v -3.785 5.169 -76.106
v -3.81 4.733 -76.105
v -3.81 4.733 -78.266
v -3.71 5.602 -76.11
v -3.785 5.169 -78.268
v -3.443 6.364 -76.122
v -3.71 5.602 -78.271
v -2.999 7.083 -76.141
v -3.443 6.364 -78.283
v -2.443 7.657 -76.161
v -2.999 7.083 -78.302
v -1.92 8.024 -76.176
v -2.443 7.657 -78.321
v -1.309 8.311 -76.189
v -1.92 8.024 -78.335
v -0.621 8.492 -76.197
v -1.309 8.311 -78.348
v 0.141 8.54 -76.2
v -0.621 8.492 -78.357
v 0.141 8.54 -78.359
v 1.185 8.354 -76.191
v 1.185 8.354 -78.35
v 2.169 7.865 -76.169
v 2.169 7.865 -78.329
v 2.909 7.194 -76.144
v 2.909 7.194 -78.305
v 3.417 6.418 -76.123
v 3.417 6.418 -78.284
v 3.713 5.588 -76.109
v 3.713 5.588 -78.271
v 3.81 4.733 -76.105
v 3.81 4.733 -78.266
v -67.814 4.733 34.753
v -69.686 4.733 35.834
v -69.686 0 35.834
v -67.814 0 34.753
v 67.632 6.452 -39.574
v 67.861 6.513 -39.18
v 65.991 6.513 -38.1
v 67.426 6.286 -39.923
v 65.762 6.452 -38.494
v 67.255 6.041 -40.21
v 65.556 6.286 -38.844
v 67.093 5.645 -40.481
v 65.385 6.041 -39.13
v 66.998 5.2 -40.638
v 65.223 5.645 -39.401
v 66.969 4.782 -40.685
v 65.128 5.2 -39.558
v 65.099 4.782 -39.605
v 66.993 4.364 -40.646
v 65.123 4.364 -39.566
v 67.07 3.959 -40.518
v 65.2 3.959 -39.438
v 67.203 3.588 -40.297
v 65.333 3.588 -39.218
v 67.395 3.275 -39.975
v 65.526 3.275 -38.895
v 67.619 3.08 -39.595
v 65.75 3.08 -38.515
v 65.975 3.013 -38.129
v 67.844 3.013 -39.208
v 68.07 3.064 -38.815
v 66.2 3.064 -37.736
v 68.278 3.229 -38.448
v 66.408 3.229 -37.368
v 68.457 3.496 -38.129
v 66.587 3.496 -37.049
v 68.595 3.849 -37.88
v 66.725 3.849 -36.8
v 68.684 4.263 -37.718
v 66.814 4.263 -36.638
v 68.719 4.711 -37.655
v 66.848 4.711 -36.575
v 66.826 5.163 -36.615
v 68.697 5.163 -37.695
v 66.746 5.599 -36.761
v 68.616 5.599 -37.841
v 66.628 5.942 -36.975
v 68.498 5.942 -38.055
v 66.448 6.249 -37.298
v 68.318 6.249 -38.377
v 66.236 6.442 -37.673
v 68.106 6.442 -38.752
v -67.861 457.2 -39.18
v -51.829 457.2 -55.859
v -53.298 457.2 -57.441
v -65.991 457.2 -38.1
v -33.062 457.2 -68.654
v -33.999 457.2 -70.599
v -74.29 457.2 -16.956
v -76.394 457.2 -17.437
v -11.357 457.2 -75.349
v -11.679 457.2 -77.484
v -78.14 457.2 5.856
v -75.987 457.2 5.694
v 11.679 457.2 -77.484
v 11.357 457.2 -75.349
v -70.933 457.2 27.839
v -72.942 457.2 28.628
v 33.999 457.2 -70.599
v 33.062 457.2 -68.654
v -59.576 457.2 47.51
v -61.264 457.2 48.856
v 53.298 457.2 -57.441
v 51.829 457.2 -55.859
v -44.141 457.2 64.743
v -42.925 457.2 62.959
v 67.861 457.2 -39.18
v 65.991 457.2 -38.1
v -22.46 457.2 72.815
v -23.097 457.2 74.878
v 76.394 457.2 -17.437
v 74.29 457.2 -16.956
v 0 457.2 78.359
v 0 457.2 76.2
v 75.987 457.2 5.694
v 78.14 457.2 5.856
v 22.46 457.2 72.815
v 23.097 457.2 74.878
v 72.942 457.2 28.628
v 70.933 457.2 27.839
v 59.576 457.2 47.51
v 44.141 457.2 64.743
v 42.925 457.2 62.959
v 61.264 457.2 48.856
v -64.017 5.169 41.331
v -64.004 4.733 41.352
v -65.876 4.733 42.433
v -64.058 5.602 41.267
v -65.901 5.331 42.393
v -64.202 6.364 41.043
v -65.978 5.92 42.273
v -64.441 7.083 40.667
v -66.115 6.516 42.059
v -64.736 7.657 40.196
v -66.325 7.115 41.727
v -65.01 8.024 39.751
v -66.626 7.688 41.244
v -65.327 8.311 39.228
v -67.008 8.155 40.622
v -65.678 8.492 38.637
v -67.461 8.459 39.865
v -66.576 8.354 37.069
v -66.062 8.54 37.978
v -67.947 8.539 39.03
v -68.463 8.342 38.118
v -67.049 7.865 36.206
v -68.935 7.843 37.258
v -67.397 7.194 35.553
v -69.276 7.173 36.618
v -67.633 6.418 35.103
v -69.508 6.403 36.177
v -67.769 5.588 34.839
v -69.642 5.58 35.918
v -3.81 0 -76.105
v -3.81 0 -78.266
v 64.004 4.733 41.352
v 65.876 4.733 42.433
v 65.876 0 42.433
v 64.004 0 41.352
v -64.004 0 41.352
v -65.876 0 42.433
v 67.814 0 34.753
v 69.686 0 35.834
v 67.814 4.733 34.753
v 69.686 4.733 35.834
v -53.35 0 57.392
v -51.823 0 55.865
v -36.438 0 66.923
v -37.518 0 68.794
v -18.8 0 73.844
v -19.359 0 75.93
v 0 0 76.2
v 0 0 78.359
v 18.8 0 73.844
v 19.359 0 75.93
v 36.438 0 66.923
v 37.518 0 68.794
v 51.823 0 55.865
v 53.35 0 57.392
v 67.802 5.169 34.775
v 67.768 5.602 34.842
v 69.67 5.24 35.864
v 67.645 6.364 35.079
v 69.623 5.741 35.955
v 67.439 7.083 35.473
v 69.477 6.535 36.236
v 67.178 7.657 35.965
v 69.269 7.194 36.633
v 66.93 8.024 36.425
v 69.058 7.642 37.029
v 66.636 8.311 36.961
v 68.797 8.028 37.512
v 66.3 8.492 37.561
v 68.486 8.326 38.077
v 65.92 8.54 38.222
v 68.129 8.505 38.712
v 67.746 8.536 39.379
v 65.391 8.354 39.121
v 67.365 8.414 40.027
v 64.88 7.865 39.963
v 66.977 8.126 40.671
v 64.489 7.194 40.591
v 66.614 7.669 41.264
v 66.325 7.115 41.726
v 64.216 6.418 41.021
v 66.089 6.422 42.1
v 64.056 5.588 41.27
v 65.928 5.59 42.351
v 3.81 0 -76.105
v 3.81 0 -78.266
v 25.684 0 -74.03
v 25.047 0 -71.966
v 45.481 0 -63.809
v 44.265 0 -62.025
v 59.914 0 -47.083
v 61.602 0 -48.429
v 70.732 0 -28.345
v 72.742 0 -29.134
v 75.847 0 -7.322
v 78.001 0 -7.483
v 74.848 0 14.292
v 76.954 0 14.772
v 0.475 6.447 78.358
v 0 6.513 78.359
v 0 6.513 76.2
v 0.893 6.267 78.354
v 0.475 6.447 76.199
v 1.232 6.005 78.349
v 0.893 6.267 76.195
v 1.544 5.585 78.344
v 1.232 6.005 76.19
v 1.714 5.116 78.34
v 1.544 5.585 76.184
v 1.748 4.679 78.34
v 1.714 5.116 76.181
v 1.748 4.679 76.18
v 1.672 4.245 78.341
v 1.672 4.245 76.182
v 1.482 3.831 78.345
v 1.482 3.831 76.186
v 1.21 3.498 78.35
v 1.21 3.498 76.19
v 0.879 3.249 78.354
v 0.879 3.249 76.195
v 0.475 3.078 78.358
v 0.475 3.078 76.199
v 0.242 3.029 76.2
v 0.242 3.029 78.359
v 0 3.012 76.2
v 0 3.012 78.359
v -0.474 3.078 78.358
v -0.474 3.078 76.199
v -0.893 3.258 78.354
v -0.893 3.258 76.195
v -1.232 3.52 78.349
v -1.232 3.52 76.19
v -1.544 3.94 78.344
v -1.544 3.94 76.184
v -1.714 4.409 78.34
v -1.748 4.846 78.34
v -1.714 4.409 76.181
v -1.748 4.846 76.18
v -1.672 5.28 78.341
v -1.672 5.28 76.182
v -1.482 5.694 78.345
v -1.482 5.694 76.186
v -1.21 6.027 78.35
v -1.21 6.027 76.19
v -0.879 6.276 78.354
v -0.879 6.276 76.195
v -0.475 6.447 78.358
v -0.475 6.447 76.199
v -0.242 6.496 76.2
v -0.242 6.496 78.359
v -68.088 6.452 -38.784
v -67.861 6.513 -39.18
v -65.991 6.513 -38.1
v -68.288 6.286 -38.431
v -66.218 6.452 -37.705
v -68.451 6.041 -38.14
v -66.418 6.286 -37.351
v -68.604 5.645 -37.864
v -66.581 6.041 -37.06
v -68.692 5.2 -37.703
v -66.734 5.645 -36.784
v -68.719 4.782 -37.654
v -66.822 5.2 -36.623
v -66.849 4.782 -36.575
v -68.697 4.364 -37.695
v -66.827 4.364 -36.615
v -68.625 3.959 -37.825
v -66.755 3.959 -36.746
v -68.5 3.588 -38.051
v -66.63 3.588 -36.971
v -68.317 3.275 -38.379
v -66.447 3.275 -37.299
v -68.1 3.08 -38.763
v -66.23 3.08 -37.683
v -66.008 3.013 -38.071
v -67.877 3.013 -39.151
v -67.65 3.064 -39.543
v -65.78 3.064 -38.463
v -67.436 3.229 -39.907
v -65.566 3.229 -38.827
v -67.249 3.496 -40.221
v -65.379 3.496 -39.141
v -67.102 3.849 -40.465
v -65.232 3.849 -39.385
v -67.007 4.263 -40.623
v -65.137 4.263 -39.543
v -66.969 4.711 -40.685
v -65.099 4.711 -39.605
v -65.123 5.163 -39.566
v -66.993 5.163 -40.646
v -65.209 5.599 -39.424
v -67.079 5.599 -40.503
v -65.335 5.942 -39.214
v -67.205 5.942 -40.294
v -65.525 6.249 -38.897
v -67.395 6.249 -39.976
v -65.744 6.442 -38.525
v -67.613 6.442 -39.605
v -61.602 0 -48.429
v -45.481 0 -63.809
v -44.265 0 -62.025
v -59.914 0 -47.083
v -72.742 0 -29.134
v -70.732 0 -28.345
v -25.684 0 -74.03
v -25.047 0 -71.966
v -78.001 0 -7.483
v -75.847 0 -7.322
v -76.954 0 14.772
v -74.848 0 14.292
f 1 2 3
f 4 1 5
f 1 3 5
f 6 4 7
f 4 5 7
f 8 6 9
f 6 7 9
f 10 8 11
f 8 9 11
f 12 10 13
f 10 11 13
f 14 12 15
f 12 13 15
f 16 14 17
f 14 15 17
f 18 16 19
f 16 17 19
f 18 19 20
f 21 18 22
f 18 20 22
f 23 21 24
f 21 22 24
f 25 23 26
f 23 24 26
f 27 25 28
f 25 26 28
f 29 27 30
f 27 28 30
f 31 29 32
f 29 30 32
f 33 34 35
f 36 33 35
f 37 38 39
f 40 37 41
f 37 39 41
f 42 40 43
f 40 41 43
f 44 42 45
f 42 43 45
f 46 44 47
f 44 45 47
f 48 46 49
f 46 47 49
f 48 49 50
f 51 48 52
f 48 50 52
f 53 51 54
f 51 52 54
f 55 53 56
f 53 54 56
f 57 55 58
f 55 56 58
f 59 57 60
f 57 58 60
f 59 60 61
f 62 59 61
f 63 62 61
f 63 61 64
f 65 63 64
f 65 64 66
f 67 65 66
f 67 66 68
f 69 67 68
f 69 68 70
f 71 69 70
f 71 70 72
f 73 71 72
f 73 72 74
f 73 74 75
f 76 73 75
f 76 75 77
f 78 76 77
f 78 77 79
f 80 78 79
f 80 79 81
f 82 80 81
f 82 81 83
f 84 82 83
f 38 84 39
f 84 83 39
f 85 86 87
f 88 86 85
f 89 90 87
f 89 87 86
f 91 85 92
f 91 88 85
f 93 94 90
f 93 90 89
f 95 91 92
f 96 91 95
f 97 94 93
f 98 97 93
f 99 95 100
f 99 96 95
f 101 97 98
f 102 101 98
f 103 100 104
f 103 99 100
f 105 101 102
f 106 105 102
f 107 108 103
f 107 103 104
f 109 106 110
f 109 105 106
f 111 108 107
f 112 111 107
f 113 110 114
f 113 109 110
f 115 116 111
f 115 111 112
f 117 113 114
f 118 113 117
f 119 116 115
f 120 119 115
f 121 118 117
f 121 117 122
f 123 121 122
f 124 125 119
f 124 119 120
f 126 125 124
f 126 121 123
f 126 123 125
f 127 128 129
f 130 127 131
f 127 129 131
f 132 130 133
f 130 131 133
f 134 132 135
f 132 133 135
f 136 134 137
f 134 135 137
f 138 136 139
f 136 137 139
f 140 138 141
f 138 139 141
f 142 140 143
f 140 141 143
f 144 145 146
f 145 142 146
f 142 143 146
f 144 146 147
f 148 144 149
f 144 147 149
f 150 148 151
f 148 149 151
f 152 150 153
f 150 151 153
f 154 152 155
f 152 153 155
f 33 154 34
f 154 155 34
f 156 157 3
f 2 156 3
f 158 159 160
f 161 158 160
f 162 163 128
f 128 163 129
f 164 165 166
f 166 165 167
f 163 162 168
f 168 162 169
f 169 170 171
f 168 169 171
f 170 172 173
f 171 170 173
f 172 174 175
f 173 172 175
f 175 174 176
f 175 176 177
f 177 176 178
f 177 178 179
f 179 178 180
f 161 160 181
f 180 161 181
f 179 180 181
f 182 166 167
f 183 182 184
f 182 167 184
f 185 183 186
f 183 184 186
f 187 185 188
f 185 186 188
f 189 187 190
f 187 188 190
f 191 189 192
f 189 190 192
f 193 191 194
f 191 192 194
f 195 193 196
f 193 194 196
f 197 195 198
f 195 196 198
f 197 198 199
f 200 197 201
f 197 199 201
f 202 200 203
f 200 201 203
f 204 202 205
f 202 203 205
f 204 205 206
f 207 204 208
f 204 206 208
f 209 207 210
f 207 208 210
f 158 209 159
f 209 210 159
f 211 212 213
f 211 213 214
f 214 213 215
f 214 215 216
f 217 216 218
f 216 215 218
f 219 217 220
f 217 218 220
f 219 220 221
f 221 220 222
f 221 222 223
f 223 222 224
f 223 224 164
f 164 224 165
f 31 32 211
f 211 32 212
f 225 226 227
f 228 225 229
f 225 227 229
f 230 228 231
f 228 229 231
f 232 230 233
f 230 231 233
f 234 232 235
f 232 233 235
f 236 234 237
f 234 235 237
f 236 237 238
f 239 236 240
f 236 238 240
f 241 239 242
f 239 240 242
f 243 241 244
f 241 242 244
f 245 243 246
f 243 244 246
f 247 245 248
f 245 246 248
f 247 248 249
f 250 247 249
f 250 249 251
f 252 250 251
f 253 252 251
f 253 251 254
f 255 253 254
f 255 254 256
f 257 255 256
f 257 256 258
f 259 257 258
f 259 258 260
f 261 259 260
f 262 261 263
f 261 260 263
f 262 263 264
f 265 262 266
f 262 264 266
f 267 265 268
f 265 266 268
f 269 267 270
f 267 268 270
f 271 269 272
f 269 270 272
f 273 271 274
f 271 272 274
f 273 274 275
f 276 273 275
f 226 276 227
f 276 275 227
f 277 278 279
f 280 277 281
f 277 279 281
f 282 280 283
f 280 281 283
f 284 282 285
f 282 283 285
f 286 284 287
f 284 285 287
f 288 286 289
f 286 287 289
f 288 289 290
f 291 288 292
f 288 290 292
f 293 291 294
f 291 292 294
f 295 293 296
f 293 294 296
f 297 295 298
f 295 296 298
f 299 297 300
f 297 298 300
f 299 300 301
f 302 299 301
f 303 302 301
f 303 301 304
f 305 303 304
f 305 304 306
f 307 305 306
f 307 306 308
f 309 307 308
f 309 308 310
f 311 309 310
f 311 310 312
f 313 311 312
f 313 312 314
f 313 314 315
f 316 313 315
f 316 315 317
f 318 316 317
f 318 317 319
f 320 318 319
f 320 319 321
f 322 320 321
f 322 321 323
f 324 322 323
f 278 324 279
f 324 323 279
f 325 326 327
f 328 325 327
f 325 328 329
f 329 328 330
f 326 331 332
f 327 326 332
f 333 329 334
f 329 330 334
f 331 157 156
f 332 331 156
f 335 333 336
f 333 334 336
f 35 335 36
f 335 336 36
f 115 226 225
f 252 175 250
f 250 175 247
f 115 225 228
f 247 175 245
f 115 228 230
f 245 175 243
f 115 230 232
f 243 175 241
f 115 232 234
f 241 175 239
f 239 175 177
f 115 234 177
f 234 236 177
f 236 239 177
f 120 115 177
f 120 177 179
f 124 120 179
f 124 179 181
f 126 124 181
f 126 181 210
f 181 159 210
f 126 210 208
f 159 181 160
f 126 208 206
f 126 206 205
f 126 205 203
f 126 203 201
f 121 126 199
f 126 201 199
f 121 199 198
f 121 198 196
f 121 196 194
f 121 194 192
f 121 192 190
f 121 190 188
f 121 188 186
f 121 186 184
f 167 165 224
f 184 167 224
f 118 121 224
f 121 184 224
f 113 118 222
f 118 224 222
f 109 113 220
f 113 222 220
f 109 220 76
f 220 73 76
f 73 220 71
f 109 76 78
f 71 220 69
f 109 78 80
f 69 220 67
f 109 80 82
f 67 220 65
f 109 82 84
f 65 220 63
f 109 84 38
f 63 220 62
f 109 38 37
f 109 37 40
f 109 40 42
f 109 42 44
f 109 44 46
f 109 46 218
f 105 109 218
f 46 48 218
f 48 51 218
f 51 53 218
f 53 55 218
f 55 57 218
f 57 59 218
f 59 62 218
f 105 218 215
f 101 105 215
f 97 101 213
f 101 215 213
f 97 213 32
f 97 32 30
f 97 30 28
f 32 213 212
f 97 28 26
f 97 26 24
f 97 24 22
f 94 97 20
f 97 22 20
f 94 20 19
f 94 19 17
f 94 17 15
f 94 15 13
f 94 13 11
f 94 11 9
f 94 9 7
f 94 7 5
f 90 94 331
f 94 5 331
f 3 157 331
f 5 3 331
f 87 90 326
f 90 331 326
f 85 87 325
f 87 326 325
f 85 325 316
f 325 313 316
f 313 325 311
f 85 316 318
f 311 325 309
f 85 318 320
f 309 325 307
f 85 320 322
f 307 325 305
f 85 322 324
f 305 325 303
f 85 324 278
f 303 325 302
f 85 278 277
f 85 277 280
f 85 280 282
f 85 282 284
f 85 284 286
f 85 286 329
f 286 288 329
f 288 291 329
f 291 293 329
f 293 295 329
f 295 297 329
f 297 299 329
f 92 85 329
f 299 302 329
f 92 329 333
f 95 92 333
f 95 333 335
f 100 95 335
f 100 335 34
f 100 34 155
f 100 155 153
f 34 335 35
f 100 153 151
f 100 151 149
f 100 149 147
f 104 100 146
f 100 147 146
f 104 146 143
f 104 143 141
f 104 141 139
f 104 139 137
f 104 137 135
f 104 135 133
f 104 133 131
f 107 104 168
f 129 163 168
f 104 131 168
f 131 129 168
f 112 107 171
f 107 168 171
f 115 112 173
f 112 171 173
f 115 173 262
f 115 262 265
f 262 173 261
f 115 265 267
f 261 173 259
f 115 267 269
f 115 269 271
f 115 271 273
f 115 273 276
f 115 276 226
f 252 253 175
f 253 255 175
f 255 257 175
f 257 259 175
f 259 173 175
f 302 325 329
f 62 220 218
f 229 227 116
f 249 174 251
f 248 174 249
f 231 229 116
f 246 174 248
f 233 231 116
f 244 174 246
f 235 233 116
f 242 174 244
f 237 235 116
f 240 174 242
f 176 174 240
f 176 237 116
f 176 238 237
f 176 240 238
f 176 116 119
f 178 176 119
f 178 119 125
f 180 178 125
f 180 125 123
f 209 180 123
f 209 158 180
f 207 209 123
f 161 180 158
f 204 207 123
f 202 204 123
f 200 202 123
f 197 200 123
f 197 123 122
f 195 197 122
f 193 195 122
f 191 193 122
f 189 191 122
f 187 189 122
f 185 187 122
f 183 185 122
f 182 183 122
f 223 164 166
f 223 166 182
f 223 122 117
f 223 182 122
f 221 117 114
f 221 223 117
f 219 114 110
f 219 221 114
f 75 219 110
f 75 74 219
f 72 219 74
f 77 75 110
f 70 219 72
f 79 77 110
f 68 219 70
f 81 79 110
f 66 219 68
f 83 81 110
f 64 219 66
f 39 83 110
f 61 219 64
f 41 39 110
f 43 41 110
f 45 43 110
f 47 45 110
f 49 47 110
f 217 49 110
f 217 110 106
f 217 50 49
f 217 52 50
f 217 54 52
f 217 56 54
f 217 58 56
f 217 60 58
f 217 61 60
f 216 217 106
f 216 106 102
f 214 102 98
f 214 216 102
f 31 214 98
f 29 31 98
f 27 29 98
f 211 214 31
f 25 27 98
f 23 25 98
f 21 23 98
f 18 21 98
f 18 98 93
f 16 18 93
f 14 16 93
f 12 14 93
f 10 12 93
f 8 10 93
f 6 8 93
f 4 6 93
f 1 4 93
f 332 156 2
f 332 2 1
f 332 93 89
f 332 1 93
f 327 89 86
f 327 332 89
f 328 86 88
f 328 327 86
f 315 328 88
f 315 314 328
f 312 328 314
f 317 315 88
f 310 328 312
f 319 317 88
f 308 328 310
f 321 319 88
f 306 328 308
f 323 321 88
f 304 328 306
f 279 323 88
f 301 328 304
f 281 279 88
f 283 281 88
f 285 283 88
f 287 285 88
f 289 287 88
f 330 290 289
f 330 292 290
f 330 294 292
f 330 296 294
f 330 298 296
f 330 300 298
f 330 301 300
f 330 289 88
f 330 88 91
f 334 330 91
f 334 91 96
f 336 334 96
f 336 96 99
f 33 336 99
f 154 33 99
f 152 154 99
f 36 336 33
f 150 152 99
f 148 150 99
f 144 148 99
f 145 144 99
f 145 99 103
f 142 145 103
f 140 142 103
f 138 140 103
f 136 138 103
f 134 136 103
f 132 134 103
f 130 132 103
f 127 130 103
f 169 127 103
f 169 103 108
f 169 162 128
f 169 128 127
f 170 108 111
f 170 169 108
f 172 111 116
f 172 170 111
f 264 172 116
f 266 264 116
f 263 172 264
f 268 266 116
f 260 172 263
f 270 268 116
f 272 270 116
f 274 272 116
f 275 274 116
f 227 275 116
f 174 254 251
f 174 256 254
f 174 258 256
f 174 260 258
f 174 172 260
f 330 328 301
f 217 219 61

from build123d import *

# Parameters (mm, degrees)
SKETCH1_R               = 78.359
SKETCH1_R_2             = 76.2
BOSS_EXTRUDE1_DEPTH     = 457.2
SKETCH2_R               = 1.750000056
CUT_EXTRUDE1_DEPTH      = 471.438206104
CIRPATTERN1_COUNT       = 6
CUT_EXTRUDE2_REACH      = 491.625
CUT_EXTRUDE2_END_RADIUS = 76.2
CIRPATTERN2_COUNT       = 3


with BuildPart() as part:
    # Sketch1 → Boss-Extrude1 (new body)
    with BuildSketch(Plane(origin=(0, 0, 0), x_dir=(1, 0, 0), z_dir=(0, 1, 0))):
        with Locations(Location((0, 0, 0), (0, 0, 270))):
            Circle(SKETCH1_R)
        with Locations(Location((0, 0, 0), (0, 0, 270))):
            Circle(SKETCH1_R_2, mode=Mode.SUBTRACT)
    extrude(amount=BOSS_EXTRUDE1_DEPTH)

    # Sketch2 → Cut-Extrude1 (cut, through all)
    with BuildSketch(Plane.XY):
        with Locations(Location((0, 4.7625, 0), (0, 0, 90))):
            Circle(SKETCH2_R)
    cut_extrude1 = extrude(amount=-CUT_EXTRUDE1_DEPTH, mode=Mode.SUBTRACT)

    # CirPattern1: Cut-Extrude1 ×6 about axis
    cirpattern1_axis = Axis((0, 457.2, 0), (0, -1, 0))
    for i in range(1, CIRPATTERN1_COUNT):
        add(cut_extrude1.rotate(cirpattern1_axis, i * 360 / CIRPATTERN1_COUNT), mode=Mode.SUBTRACT)

    # Cut-Extrude2: up to this cylinder (the profile starts outside it)
    cut_extrude2_end = Plane(origin=(0, 3.909431, 0), z_dir=(0, -1, 0)) * Cylinder(CUT_EXTRUDE2_END_RADIUS, 1136.65, mode=Mode.PRIVATE)
    # Sketch3 → Cut-Extrude2 (cut, up to the surface)
    with BuildSketch(Plane(origin=(0, 0, -78.359), x_dir=(-1, 0, 0), z_dir=(0, 0, -1)), mode=Mode.PRIVATE) as cut_extrude2_sk1:
        with BuildLine():
            Line((-3.81, 4.732887187), (-3.81, 0))
            Line((-3.81, 0), (3.81, 0))
            Line((3.81, 0), (3.81, 4.732887187))
            ThreePointArc((3.81, 4.732887187), (0, 8.542887187), (-3.81, 4.732887187))
        make_face()
    cut_extrude2_tool1 = extrude(cut_extrude2_sk1.sketch, amount=-CUT_EXTRUDE2_REACH, mode=Mode.PRIVATE) - cut_extrude2_end
    cut_extrude2 = cut_extrude2_tool1.solids().sort_by_distance((0, 3.909431, -78.359))[0]
    add(cut_extrude2, mode=Mode.SUBTRACT)

    # CirPattern2: Cut-Extrude2 ×3 about axis
    cirpattern2_axis = Axis((0, 0, 0), (0, 1, 0))
    for i in range(1, CIRPATTERN2_COUNT):
        add(cut_extrude2.rotate(cirpattern2_axis, i * 360 / CIRPATTERN2_COUNT), mode=Mode.SUBTRACT)


solid = part.part
